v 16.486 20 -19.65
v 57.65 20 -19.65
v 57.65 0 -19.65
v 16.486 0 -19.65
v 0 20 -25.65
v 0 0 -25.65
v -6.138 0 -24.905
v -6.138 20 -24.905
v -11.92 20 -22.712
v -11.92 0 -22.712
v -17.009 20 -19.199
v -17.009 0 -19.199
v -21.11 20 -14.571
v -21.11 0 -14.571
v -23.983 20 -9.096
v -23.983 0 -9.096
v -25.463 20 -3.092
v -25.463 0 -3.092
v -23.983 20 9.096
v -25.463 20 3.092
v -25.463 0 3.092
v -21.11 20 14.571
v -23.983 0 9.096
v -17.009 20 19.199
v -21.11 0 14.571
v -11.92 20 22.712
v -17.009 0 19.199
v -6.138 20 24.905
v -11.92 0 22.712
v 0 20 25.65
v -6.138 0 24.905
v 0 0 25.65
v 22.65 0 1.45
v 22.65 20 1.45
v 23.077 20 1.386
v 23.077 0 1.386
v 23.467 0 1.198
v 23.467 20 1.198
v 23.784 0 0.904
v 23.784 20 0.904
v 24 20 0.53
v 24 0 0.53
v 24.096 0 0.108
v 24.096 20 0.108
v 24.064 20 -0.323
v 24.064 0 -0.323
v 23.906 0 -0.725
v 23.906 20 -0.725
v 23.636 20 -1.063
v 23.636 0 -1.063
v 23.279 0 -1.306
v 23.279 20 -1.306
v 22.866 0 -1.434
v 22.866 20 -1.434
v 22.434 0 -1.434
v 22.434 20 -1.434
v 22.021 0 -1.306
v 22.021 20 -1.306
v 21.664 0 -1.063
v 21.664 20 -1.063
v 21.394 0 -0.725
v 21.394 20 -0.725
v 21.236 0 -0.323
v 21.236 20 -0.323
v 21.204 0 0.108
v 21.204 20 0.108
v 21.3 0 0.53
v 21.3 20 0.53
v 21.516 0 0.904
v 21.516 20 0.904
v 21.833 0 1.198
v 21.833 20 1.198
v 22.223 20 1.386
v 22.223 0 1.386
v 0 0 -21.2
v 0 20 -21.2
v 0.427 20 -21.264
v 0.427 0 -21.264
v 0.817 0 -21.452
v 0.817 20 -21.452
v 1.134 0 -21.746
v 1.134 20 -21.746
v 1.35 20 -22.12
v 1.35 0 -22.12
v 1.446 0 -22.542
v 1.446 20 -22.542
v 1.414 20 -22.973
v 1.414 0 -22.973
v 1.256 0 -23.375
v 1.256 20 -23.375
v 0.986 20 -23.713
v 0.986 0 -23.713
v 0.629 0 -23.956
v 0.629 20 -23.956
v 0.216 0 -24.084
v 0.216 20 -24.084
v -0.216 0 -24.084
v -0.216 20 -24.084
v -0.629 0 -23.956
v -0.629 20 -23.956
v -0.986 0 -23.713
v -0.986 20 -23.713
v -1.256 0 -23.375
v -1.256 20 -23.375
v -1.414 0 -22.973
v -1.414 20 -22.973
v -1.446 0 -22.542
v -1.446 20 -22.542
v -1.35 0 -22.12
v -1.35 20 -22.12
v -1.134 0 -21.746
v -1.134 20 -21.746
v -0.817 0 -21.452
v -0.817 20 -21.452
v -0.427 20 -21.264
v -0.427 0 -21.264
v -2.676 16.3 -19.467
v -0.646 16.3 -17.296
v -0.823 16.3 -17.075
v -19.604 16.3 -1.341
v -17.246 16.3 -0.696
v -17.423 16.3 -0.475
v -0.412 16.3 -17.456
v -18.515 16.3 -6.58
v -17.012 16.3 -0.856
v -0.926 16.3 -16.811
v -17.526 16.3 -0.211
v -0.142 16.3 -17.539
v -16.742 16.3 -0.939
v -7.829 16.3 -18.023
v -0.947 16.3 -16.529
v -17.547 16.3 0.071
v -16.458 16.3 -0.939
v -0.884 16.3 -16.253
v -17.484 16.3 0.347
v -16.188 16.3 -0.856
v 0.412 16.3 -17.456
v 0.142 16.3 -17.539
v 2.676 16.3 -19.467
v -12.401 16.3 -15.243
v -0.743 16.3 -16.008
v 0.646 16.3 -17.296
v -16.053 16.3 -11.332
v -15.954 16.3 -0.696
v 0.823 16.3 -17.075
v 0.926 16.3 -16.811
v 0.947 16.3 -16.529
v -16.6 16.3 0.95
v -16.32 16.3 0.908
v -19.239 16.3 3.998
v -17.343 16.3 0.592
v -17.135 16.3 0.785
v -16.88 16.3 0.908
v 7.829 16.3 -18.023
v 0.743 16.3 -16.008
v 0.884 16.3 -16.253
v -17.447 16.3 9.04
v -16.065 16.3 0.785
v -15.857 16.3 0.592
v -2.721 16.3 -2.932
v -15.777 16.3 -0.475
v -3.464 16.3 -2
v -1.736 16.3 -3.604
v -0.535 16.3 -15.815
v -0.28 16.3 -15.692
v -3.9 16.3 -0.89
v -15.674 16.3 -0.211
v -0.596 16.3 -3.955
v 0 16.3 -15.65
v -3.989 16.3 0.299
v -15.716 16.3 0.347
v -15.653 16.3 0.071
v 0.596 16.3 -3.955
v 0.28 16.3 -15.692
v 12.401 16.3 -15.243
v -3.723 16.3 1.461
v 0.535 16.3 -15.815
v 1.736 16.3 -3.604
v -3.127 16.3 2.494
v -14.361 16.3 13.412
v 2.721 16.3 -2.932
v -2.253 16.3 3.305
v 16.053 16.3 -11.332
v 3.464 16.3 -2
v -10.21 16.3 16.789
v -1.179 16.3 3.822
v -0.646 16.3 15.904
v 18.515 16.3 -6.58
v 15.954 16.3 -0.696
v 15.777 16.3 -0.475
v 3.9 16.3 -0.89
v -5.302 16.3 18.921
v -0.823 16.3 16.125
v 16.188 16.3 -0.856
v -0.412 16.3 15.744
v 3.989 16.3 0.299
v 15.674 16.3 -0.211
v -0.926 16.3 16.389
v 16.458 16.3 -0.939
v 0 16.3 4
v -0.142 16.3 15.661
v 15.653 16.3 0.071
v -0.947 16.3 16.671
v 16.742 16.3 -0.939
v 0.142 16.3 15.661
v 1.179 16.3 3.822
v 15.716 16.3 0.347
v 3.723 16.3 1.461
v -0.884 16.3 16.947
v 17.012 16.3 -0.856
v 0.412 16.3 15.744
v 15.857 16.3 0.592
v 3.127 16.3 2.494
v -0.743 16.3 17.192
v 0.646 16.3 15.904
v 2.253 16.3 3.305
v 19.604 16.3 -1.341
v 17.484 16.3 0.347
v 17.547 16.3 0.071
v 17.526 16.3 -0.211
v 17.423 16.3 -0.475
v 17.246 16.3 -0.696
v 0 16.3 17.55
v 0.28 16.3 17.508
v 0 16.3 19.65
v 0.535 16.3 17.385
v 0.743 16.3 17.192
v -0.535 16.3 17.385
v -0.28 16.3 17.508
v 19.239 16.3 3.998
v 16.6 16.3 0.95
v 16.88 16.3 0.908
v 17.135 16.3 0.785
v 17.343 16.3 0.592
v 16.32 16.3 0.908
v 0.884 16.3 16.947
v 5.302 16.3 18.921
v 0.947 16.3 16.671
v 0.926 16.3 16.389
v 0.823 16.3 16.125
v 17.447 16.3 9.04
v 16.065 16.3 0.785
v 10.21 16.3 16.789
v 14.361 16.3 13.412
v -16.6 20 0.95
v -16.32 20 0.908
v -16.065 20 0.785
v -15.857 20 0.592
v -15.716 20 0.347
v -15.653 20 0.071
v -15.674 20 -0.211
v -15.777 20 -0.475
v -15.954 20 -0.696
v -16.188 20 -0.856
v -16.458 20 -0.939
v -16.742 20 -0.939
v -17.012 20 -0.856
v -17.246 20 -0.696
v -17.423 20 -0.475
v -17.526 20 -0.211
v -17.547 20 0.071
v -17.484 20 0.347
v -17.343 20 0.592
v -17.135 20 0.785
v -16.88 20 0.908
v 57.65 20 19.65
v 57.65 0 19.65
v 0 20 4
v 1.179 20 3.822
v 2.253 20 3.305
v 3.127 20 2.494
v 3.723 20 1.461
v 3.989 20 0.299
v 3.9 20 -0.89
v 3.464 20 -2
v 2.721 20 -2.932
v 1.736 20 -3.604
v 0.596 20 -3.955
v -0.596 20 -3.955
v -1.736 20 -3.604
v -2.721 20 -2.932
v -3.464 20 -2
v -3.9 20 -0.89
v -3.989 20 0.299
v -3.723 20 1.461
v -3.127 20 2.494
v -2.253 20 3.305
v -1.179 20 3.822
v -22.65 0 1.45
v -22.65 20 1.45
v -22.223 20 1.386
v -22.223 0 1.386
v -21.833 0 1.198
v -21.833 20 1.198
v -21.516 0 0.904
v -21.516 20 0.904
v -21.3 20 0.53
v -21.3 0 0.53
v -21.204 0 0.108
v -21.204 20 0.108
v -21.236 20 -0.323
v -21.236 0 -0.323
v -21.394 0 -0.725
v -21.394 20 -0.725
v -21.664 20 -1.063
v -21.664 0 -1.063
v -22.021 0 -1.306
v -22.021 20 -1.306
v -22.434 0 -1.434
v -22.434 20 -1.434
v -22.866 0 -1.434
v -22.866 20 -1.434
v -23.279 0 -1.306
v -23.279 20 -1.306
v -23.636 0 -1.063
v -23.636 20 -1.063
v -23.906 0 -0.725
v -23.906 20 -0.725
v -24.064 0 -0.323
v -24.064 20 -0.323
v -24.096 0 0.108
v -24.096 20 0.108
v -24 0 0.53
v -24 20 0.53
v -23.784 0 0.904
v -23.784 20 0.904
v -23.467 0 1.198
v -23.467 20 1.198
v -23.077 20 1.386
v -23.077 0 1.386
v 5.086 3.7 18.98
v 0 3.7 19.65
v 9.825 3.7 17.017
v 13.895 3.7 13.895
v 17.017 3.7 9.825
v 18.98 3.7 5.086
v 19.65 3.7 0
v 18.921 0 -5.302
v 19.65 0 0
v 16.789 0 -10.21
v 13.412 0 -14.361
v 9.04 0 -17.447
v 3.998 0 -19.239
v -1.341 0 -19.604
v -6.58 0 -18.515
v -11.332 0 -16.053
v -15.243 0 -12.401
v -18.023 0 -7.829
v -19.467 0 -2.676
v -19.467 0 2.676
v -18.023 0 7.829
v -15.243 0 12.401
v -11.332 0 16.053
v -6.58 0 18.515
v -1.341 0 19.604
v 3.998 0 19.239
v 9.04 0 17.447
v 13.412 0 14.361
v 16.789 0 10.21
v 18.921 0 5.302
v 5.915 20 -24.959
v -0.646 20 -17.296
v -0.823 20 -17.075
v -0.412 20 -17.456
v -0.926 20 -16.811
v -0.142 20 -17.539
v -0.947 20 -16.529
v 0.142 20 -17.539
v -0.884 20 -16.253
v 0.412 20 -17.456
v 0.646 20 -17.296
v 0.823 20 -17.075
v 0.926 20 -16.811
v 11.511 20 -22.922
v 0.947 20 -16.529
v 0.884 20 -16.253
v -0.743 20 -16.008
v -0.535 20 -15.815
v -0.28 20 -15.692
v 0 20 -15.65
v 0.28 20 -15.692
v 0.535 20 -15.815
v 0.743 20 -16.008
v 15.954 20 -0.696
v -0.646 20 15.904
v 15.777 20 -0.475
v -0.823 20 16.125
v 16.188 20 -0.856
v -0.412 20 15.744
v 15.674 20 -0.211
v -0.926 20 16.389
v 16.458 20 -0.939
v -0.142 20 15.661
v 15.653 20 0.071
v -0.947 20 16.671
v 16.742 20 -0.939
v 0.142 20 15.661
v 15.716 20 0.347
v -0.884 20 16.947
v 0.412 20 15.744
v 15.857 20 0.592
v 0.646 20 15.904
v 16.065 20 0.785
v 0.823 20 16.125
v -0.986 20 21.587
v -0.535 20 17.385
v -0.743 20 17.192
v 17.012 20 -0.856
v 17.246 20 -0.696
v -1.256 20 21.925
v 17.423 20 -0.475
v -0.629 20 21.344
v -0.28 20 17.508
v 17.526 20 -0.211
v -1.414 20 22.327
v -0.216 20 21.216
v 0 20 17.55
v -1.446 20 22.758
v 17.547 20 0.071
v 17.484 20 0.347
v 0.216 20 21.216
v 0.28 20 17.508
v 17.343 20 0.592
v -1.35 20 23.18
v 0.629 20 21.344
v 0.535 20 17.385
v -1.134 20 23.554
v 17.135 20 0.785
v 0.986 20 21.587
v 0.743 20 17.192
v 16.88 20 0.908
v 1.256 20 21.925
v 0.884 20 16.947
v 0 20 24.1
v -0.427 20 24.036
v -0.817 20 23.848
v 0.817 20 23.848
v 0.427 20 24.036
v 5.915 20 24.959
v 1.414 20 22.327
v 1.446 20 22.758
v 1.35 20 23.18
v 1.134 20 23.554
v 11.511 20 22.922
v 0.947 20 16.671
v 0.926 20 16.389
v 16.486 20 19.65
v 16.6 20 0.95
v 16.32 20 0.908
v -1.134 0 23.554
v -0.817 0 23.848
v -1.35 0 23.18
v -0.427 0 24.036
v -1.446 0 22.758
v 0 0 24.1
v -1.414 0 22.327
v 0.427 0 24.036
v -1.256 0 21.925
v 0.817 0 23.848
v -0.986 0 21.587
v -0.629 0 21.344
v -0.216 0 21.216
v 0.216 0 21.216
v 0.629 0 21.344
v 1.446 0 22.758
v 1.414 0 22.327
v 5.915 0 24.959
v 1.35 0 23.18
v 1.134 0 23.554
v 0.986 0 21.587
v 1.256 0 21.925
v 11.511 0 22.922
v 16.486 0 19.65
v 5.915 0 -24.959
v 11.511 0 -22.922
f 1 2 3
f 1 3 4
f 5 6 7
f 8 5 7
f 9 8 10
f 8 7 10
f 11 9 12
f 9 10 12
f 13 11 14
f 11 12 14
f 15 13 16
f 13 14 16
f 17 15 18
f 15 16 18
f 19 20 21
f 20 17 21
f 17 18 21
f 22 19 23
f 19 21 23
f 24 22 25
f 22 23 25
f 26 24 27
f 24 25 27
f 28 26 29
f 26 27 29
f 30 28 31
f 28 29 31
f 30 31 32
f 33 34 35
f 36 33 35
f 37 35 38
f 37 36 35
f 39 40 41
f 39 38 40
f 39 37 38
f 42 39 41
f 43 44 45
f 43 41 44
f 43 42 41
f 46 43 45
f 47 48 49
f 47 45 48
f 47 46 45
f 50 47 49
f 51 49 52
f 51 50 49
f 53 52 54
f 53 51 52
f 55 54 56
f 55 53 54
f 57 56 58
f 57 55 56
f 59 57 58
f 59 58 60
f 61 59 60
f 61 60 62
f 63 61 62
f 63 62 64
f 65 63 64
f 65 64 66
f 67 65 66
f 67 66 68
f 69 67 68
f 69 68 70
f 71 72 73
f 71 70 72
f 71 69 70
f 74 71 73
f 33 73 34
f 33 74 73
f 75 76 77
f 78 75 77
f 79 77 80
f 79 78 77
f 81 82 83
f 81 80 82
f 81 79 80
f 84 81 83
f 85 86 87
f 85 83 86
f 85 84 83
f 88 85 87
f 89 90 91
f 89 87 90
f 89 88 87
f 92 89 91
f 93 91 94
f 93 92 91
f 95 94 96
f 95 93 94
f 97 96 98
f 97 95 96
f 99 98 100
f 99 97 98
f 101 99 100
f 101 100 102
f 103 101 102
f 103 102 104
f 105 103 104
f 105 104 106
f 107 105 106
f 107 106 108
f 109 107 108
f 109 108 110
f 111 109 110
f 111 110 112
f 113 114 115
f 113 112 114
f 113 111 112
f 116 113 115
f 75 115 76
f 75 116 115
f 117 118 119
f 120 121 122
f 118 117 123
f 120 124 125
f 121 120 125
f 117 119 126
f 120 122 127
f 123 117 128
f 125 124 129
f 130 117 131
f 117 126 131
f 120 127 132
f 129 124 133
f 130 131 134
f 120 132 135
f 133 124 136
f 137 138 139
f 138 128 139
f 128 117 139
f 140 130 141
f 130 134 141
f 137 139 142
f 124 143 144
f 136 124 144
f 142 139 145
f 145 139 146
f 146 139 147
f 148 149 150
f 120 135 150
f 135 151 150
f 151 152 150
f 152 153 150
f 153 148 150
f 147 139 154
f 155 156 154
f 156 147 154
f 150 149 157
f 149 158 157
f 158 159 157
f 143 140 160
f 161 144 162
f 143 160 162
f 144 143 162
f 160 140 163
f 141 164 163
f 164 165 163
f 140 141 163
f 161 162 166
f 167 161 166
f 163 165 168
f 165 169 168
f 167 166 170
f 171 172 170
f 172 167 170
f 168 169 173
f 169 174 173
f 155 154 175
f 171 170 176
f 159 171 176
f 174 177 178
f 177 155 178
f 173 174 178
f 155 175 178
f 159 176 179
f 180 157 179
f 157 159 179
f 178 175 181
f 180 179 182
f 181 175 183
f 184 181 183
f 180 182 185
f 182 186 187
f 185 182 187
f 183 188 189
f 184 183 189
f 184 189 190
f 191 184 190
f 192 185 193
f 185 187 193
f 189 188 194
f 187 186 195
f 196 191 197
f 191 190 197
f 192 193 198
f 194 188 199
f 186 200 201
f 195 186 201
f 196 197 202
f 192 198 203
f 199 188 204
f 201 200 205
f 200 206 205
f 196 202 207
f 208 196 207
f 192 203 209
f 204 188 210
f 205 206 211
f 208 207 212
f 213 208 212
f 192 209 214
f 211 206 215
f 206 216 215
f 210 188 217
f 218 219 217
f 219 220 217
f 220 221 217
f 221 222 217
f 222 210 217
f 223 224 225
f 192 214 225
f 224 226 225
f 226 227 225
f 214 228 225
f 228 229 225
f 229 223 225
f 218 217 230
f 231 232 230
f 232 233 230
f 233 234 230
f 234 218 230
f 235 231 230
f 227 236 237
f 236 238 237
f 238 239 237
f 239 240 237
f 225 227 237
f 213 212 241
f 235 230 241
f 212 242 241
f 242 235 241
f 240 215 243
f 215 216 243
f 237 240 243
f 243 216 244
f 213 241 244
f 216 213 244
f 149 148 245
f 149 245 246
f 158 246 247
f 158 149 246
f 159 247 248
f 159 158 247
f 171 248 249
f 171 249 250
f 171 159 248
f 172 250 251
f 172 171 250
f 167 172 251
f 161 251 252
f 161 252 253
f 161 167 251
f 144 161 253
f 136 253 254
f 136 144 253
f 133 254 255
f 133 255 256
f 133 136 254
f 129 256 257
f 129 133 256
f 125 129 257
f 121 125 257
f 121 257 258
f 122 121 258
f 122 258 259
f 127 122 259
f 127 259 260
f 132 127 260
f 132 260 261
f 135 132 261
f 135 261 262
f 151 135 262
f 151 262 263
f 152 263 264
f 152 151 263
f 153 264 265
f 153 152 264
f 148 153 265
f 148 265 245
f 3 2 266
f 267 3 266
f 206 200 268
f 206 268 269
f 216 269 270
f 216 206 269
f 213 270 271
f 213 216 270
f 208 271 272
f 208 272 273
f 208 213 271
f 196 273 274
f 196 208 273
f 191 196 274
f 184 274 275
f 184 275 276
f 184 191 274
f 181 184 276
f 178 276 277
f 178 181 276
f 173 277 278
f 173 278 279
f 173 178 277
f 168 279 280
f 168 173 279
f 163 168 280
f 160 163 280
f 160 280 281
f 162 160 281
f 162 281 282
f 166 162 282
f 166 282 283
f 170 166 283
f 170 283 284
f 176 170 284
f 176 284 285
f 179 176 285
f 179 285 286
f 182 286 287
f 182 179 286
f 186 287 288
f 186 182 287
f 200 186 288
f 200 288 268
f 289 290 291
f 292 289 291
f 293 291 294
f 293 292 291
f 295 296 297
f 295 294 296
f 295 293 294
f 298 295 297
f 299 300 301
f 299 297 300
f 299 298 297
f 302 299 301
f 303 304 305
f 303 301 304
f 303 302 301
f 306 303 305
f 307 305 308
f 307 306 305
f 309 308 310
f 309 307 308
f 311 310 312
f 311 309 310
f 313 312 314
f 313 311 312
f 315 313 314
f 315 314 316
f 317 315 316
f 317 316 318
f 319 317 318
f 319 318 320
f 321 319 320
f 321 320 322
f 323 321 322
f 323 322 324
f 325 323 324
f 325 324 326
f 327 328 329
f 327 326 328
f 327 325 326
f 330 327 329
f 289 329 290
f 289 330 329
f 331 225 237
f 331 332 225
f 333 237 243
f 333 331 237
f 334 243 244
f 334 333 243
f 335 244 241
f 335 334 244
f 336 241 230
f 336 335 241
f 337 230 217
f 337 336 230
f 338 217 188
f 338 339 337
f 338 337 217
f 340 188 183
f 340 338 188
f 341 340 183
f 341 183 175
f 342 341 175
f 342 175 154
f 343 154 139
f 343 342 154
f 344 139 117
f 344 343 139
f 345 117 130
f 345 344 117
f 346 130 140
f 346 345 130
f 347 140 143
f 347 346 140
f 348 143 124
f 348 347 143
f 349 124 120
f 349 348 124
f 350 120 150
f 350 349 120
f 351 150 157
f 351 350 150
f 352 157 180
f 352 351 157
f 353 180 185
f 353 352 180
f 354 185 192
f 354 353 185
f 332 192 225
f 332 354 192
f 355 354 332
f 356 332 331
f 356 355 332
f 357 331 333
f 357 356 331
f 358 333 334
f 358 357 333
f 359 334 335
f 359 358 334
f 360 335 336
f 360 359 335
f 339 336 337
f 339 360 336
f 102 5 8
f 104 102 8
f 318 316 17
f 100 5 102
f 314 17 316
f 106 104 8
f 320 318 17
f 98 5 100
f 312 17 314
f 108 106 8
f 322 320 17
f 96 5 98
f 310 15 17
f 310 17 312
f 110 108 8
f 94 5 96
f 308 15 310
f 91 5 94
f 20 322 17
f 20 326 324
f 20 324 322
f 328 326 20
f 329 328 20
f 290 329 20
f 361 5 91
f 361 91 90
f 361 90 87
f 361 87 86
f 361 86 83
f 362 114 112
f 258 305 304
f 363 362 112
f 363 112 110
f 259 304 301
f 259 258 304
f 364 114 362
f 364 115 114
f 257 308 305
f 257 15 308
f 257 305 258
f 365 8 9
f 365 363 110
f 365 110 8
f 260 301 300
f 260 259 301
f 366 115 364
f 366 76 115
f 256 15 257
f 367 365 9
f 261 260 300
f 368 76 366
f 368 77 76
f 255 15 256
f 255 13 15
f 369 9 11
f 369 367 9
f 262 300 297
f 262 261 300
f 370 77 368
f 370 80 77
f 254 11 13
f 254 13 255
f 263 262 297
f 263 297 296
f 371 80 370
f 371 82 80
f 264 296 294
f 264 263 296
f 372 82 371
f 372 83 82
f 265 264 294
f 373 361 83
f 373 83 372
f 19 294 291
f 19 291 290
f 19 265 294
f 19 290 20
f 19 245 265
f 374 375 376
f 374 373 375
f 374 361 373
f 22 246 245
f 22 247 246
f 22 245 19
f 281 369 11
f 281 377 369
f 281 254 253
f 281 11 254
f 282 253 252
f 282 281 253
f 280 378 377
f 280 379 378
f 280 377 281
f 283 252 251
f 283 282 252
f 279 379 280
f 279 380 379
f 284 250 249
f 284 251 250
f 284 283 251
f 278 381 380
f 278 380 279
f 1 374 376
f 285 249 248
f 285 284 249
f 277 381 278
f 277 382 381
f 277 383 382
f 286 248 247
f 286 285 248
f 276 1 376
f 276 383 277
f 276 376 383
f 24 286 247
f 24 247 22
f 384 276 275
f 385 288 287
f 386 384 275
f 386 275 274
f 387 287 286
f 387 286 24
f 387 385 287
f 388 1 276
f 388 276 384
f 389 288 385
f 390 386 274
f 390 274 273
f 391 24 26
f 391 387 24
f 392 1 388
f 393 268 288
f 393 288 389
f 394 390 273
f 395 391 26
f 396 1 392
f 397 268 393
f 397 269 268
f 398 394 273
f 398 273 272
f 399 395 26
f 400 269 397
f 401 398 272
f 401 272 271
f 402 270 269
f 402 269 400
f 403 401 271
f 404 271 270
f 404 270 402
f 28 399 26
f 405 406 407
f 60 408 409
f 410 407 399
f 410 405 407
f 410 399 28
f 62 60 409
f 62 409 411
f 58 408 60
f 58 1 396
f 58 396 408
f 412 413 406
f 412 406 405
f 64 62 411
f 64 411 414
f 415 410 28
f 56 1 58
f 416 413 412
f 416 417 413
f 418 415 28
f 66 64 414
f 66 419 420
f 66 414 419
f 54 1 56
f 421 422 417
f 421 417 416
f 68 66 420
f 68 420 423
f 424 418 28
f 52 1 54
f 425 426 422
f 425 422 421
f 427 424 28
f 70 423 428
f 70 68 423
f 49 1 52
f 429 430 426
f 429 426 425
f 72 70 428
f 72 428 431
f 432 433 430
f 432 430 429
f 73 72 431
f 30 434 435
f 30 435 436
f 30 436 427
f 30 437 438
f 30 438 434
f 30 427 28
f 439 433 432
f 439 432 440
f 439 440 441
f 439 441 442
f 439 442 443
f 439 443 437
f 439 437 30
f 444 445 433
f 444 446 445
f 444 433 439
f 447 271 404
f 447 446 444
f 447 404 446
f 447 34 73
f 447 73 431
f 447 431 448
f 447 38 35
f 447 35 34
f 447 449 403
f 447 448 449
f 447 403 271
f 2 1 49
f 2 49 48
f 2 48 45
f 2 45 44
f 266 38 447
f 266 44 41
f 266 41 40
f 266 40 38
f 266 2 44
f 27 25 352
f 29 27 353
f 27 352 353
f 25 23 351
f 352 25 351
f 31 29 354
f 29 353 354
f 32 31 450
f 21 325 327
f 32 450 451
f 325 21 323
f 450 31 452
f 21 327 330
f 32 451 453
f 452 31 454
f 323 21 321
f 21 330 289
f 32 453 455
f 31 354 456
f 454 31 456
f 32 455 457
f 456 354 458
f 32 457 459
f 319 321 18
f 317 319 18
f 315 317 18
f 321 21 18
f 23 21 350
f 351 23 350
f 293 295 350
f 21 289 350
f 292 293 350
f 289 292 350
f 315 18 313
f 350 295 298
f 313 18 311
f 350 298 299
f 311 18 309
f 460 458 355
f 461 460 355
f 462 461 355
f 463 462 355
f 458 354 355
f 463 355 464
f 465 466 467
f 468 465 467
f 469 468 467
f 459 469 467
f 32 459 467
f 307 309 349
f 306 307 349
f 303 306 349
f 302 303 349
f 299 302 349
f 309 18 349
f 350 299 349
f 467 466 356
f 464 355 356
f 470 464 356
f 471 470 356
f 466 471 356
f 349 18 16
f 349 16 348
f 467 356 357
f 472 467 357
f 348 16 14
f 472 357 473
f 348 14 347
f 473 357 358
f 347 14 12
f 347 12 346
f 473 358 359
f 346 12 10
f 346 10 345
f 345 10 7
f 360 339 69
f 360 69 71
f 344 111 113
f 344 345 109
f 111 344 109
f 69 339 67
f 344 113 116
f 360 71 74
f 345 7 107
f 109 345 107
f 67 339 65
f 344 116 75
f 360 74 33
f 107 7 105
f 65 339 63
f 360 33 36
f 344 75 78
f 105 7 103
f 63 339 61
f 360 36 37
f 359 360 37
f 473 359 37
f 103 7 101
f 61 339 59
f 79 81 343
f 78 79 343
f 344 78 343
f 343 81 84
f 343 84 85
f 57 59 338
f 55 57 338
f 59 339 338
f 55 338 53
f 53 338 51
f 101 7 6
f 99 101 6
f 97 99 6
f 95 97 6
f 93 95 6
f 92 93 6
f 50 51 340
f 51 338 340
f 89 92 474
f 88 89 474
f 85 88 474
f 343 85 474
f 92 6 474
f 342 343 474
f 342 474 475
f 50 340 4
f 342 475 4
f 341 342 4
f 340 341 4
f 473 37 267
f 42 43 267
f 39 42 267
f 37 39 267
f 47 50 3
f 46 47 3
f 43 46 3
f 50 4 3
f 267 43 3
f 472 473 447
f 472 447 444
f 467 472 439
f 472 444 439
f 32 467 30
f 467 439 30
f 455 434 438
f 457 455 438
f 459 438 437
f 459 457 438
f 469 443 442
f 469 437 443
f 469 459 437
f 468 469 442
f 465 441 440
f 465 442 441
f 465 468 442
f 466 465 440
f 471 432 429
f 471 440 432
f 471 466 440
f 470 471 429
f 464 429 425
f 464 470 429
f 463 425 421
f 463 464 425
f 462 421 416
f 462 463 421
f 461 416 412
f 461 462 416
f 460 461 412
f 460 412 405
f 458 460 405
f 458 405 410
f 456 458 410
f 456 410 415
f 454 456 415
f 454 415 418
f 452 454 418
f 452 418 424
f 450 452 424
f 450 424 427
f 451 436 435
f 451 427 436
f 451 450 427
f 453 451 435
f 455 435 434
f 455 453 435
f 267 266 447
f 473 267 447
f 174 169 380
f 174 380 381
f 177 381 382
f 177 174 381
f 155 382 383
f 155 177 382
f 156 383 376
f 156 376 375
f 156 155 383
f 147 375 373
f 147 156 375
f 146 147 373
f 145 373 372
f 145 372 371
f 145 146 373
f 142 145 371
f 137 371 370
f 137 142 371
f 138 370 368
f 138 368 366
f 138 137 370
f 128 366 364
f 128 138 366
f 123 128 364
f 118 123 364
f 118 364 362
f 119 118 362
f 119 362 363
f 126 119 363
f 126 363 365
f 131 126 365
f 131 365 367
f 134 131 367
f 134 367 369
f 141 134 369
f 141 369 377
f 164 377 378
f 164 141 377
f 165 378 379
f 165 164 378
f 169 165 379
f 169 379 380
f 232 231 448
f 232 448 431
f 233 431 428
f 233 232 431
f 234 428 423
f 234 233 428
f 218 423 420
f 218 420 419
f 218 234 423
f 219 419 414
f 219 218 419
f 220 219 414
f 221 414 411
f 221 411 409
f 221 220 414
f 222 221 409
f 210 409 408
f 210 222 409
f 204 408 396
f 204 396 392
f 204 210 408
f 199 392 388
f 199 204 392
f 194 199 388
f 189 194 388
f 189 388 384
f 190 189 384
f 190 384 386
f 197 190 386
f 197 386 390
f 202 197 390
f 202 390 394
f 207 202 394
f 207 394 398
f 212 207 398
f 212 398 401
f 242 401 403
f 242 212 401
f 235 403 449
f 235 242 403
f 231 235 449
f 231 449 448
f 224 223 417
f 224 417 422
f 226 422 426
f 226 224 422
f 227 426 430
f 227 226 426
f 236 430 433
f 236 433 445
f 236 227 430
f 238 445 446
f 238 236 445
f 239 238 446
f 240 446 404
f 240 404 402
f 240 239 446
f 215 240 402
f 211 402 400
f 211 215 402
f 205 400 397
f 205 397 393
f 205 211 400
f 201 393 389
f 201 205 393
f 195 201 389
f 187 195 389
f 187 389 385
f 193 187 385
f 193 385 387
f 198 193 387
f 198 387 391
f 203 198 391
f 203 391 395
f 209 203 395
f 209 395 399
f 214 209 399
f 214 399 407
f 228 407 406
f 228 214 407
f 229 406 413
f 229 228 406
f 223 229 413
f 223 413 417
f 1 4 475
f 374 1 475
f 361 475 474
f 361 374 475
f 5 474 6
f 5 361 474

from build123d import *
from build123d.topology import SkipClean

# Parameters (mm, degrees)
SKETCH1_R               = 0.95
SKETCH1_R_2             = 4
BOSS_EXTRUDE2_DEPTH     = 3.7
SKETCH5_W               = 40.16
SKETCH5_H               = 20.39
SKETCH5_R               = 19.65
BOSS_EXTRUDE3_DEPTH     = 28.1
CUT_EXTRUDE1_REACH      = 133.143
SKETCH6_W               = 40.16
SKETCH6_H               = 28.1
CUT_EXTRUDE2_REACH      = 140.14
SKETCH7_W               = 29.863740461
SKETCH7_H               = 10
CUT_EXTRUDE3_DEPTH      = 129.730214499
CUT_EXTRUDE3_DEPTH_BACK = 129.730214499
SKETCH8_R               = 1.45
SKETCH9_R               = 0.95
CUT_EXTRUDE4_DEPTH      = 12
CUT_EXTRUDE5_DEPTH      = 129.730214499
FILLET1_R               = 2
CUT_EXTRUDE6_DEPTH      = 11.8
BOSS_EXTRUDE4_START     = -3.7
SKETCH14_R              = 19.65
SKETCH14_R_2            = 0.95
SKETCH14_R_3            = 4
BOSS_EXTRUDE4_DEPTH     = 3.7
CUT_EXTRUDE7_REACH      = 130.73
SKETCH15_R              = 19.65
SKETCH16_W              = 39.3
SKETCH16_H              = 31.8
CUT_EXTRUDE8_DEPTH      = 93.779590967


with BuildPart() as part:
    # Sketch1 → Boss-Extrude2 (new body)
    with BuildSketch(Plane(origin=(0, 0, 0), x_dir=(1, 0, 0), z_dir=(0, 1, 0))):
        with BuildLine():
            Line((96.425, 25.65), (0, 25.65))
            ThreePointArc((0, 25.65), (-25.65, 0), (0, -25.65))
            Line((0, -25.65), (96.425, -25.65))
            ThreePointArc((96.425, -25.65), (122.075, 0), (96.425, 25.65))
        make_face()
        with Locations((0, 16.6)):
            Circle(SKETCH1_R, mode=Mode.SUBTRACT)
        with Locations((0, -16.6)):
            Circle(SKETCH1_R, mode=Mode.SUBTRACT)
        with Locations((-16.6, 0)):
            Circle(SKETCH1_R, mode=Mode.SUBTRACT)
        Circle(SKETCH1_R_2, mode=Mode.SUBTRACT)
        with Locations((16.6, 0)):
            Circle(SKETCH1_R, mode=Mode.SUBTRACT)
    extrude(amount=BOSS_EXTRUDE2_DEPTH)

    # Sketch5 → Boss-Extrude3 (add)
    with BuildSketch(Plane(origin=(0, 3.7, 0), x_dir=(1, 0, 0), z_dir=(0, 1, 0))):
        with BuildLine():
            Line((96.425, 25.65), (0, 25.65))
            ThreePointArc((0, 25.65), (-25.65, 0), (0, -25.65))
            Line((0, -25.65), (96.425, -25.65))
            ThreePointArc((96.425, -25.65), (122.075, 0), (96.425, 25.65))
        make_face()
        with Locations((86.23, 0)):
            Rectangle(SKETCH5_W, SKETCH5_H, mode=Mode.SUBTRACT)
        Circle(SKETCH5_R, mode=Mode.SUBTRACT)
    extrude(amount=BOSS_EXTRUDE3_DEPTH)

    # Sketch6 → Cut-Extrude1 (cut, up to next)
    with BuildSketch(Plane.XY.offset(-10.195), mode=Mode.PRIVATE) as cut_extrude1_sk1:
        with Locations((86.23, 17.75)):
            Rectangle(SKETCH6_W, SKETCH6_H)
    cut_extrude1_tool1 = extrude(cut_extrude1_sk1.sketch, amount=-CUT_EXTRUDE1_REACH, mode=Mode.PRIVATE) & part.part
    add(cut_extrude1_tool1.solids().sort_by_distance((86.23, 17.75, -10.195))[0], mode=Mode.SUBTRACT)

    # Sketch7 → Cut-Extrude2 (cut, up to next)
    with BuildSketch(Plane.ZY.offset(-106.31), mode=Mode.PRIVATE) as cut_extrude2_sk1:
        with Locations((-8.736870231, 8.7)):
            Rectangle(SKETCH7_W, SKETCH7_H)
    cut_extrude2_tool1 = extrude(cut_extrude2_sk1.sketch, amount=-CUT_EXTRUDE2_REACH, mode=Mode.PRIVATE) & part.part
    add(cut_extrude2_tool1.solids().sort_by_distance((106.31, 8.7, -8.73687))[0], mode=Mode.SUBTRACT)

    # Sketch8 → Cut-Extrude3 (cut, two sides: drawn at the far end of the back side and taken through both)
    with BuildSketch(Plane(origin=(0, 31.8, 0), x_dir=(1, 0, 0), z_dir=(0, 1, 0)).offset(-CUT_EXTRUDE3_DEPTH_BACK)):
        with Locations((22.65, 0)):
            Circle(SKETCH8_R)
        with Locations((0, -22.65)):
            Circle(SKETCH8_R)
        with Locations((-22.65, 0)):
            Circle(SKETCH8_R)
        with Locations((0, 22.65)):
            Circle(SKETCH8_R)
    extrude(amount=CUT_EXTRUDE3_DEPTH + CUT_EXTRUDE3_DEPTH_BACK, mode=Mode.SUBTRACT)

    # Sketch9 → Cut-Extrude4 (cut)
    with BuildSketch(Plane(origin=(0, 31.8, 0), x_dir=(1, 0, 0), z_dir=(0, 1, 0))):
        with Locations((61.88, -4.95)):
            Circle(SKETCH9_R)
        with Locations((61.88, 4.95)):
            Circle(SKETCH9_R)
        with Locations((109.756875612, -4.95)):
            Circle(SKETCH9_R)
        with Locations((109.756875612, 4.95)):
            Circle(SKETCH9_R)
    extrude(amount=-CUT_EXTRUDE4_DEPTH, mode=Mode.SUBTRACT)

    # Sketch12 → Cut-Extrude5 (cut, through all)
    with SkipClean():  # the faces are left unmerged after this step: merging them gives an invalid solid
        with BuildSketch(Plane(origin=(0, 31.8, 0), x_dir=(1, 0, 0), z_dir=(0, 1, 0))):
            with BuildLine():
                Line((0, 25.65), (96.425, 25.65))
                ThreePointArc((96.425, 25.65), (105.19711491, 24.103371134), (112.911357997, 19.65))
                Line((112.911357997, 19.65), (16.486357997, 19.65))
                ThreePointArc((16.486357997, 19.65), (8.77211491, 24.103371134), (0, 25.65))
            make_face()
            with BuildLine():
                Line((0, -25.65), (96.425, -25.65))
                ThreePointArc((96.425, -25.65), (105.19711491, -24.103371134), (112.911357997, -19.65))
                Line((112.911357997, -19.65), (16.486357997, -19.65))
                ThreePointArc((16.486357997, -19.65), (8.77211491, -24.103371134), (0, -25.65))
            make_face()
        extrude(amount=-CUT_EXTRUDE5_DEPTH, mode=Mode.SUBTRACT)

    # Fillet1
    fillet1_edges = [part.edges().sort_by_distance(p)[0] for p in [
        (106.31, 22.75, -19.65),
        (66.15, 17.75, -19.65),
    ]]
    fillet(fillet1_edges, radius=FILLET1_R)

    # Sketch13 → Cut-Extrude6 (cut)
    with SkipClean():  # the faces are left unmerged after this step: merging them gives an invalid solid
        with BuildSketch(Plane(origin=(0, 31.8, 0), x_dir=(1, 0, 0), z_dir=(0, 1, 0))):
            with BuildLine():
                Line((57.65, 19.65), (57.65, -19.65))
                Line((57.65, -19.65), (16.486357997, -19.65))
                ThreePointArc((16.486357997, -19.65), (-25.65, 0), (16.486357997, 19.65))
                Line((16.486357997, 19.65), (57.65, 19.65))
            make_face()
        extrude(amount=-CUT_EXTRUDE6_DEPTH, mode=Mode.SUBTRACT)

    # Sketch14 → Boss-Extrude4 (add)
    with SkipClean():  # the faces are left unmerged after this step: merging them gives an invalid solid
        with BuildSketch(Plane(origin=(0, 20, 0), x_dir=(1, 0, 0), z_dir=(0, 1, 0)).offset(BOSS_EXTRUDE4_START)):
            Circle(SKETCH14_R)
            with Locations((0, -16.6)):
                Circle(SKETCH14_R_2, mode=Mode.SUBTRACT)
            with Locations((-16.6, 0)):
                Circle(SKETCH14_R_2, mode=Mode.SUBTRACT)
            Circle(SKETCH14_R_3, mode=Mode.SUBTRACT)
            with Locations((16.6, 0)):
                Circle(SKETCH14_R_2, mode=Mode.SUBTRACT)
            with Locations((0, 16.6)):
                Circle(SKETCH14_R_2, mode=Mode.SUBTRACT)
        extrude(amount=BOSS_EXTRUDE4_DEPTH)

    # Sketch15 → Cut-Extrude7 (cut, up to next)
    with BuildSketch(Plane.XZ, mode=Mode.PRIVATE) as cut_extrude7_sk1:
        Circle(SKETCH15_R)
    cut_extrude7_tool1 = extrude(cut_extrude7_sk1.sketch, amount=-CUT_EXTRUDE7_REACH, mode=Mode.PRIVATE) & part.part
    add(cut_extrude7_tool1.solids().sort_by_distance((0, 0, 0))[0], mode=Mode.SUBTRACT)

    # Sketch16 → Cut-Extrude8 (cut, through all)
    with SkipClean():  # the faces are left unmerged after this step: merging them gives an invalid solid
        with BuildSketch(Plane.ZY.offset(-57.65)):
            with Locations((0, 15.9)):
                Rectangle(SKETCH16_W, SKETCH16_H)
        extrude(amount=-CUT_EXTRUDE8_DEPTH, mode=Mode.SUBTRACT)


solid = part.part
